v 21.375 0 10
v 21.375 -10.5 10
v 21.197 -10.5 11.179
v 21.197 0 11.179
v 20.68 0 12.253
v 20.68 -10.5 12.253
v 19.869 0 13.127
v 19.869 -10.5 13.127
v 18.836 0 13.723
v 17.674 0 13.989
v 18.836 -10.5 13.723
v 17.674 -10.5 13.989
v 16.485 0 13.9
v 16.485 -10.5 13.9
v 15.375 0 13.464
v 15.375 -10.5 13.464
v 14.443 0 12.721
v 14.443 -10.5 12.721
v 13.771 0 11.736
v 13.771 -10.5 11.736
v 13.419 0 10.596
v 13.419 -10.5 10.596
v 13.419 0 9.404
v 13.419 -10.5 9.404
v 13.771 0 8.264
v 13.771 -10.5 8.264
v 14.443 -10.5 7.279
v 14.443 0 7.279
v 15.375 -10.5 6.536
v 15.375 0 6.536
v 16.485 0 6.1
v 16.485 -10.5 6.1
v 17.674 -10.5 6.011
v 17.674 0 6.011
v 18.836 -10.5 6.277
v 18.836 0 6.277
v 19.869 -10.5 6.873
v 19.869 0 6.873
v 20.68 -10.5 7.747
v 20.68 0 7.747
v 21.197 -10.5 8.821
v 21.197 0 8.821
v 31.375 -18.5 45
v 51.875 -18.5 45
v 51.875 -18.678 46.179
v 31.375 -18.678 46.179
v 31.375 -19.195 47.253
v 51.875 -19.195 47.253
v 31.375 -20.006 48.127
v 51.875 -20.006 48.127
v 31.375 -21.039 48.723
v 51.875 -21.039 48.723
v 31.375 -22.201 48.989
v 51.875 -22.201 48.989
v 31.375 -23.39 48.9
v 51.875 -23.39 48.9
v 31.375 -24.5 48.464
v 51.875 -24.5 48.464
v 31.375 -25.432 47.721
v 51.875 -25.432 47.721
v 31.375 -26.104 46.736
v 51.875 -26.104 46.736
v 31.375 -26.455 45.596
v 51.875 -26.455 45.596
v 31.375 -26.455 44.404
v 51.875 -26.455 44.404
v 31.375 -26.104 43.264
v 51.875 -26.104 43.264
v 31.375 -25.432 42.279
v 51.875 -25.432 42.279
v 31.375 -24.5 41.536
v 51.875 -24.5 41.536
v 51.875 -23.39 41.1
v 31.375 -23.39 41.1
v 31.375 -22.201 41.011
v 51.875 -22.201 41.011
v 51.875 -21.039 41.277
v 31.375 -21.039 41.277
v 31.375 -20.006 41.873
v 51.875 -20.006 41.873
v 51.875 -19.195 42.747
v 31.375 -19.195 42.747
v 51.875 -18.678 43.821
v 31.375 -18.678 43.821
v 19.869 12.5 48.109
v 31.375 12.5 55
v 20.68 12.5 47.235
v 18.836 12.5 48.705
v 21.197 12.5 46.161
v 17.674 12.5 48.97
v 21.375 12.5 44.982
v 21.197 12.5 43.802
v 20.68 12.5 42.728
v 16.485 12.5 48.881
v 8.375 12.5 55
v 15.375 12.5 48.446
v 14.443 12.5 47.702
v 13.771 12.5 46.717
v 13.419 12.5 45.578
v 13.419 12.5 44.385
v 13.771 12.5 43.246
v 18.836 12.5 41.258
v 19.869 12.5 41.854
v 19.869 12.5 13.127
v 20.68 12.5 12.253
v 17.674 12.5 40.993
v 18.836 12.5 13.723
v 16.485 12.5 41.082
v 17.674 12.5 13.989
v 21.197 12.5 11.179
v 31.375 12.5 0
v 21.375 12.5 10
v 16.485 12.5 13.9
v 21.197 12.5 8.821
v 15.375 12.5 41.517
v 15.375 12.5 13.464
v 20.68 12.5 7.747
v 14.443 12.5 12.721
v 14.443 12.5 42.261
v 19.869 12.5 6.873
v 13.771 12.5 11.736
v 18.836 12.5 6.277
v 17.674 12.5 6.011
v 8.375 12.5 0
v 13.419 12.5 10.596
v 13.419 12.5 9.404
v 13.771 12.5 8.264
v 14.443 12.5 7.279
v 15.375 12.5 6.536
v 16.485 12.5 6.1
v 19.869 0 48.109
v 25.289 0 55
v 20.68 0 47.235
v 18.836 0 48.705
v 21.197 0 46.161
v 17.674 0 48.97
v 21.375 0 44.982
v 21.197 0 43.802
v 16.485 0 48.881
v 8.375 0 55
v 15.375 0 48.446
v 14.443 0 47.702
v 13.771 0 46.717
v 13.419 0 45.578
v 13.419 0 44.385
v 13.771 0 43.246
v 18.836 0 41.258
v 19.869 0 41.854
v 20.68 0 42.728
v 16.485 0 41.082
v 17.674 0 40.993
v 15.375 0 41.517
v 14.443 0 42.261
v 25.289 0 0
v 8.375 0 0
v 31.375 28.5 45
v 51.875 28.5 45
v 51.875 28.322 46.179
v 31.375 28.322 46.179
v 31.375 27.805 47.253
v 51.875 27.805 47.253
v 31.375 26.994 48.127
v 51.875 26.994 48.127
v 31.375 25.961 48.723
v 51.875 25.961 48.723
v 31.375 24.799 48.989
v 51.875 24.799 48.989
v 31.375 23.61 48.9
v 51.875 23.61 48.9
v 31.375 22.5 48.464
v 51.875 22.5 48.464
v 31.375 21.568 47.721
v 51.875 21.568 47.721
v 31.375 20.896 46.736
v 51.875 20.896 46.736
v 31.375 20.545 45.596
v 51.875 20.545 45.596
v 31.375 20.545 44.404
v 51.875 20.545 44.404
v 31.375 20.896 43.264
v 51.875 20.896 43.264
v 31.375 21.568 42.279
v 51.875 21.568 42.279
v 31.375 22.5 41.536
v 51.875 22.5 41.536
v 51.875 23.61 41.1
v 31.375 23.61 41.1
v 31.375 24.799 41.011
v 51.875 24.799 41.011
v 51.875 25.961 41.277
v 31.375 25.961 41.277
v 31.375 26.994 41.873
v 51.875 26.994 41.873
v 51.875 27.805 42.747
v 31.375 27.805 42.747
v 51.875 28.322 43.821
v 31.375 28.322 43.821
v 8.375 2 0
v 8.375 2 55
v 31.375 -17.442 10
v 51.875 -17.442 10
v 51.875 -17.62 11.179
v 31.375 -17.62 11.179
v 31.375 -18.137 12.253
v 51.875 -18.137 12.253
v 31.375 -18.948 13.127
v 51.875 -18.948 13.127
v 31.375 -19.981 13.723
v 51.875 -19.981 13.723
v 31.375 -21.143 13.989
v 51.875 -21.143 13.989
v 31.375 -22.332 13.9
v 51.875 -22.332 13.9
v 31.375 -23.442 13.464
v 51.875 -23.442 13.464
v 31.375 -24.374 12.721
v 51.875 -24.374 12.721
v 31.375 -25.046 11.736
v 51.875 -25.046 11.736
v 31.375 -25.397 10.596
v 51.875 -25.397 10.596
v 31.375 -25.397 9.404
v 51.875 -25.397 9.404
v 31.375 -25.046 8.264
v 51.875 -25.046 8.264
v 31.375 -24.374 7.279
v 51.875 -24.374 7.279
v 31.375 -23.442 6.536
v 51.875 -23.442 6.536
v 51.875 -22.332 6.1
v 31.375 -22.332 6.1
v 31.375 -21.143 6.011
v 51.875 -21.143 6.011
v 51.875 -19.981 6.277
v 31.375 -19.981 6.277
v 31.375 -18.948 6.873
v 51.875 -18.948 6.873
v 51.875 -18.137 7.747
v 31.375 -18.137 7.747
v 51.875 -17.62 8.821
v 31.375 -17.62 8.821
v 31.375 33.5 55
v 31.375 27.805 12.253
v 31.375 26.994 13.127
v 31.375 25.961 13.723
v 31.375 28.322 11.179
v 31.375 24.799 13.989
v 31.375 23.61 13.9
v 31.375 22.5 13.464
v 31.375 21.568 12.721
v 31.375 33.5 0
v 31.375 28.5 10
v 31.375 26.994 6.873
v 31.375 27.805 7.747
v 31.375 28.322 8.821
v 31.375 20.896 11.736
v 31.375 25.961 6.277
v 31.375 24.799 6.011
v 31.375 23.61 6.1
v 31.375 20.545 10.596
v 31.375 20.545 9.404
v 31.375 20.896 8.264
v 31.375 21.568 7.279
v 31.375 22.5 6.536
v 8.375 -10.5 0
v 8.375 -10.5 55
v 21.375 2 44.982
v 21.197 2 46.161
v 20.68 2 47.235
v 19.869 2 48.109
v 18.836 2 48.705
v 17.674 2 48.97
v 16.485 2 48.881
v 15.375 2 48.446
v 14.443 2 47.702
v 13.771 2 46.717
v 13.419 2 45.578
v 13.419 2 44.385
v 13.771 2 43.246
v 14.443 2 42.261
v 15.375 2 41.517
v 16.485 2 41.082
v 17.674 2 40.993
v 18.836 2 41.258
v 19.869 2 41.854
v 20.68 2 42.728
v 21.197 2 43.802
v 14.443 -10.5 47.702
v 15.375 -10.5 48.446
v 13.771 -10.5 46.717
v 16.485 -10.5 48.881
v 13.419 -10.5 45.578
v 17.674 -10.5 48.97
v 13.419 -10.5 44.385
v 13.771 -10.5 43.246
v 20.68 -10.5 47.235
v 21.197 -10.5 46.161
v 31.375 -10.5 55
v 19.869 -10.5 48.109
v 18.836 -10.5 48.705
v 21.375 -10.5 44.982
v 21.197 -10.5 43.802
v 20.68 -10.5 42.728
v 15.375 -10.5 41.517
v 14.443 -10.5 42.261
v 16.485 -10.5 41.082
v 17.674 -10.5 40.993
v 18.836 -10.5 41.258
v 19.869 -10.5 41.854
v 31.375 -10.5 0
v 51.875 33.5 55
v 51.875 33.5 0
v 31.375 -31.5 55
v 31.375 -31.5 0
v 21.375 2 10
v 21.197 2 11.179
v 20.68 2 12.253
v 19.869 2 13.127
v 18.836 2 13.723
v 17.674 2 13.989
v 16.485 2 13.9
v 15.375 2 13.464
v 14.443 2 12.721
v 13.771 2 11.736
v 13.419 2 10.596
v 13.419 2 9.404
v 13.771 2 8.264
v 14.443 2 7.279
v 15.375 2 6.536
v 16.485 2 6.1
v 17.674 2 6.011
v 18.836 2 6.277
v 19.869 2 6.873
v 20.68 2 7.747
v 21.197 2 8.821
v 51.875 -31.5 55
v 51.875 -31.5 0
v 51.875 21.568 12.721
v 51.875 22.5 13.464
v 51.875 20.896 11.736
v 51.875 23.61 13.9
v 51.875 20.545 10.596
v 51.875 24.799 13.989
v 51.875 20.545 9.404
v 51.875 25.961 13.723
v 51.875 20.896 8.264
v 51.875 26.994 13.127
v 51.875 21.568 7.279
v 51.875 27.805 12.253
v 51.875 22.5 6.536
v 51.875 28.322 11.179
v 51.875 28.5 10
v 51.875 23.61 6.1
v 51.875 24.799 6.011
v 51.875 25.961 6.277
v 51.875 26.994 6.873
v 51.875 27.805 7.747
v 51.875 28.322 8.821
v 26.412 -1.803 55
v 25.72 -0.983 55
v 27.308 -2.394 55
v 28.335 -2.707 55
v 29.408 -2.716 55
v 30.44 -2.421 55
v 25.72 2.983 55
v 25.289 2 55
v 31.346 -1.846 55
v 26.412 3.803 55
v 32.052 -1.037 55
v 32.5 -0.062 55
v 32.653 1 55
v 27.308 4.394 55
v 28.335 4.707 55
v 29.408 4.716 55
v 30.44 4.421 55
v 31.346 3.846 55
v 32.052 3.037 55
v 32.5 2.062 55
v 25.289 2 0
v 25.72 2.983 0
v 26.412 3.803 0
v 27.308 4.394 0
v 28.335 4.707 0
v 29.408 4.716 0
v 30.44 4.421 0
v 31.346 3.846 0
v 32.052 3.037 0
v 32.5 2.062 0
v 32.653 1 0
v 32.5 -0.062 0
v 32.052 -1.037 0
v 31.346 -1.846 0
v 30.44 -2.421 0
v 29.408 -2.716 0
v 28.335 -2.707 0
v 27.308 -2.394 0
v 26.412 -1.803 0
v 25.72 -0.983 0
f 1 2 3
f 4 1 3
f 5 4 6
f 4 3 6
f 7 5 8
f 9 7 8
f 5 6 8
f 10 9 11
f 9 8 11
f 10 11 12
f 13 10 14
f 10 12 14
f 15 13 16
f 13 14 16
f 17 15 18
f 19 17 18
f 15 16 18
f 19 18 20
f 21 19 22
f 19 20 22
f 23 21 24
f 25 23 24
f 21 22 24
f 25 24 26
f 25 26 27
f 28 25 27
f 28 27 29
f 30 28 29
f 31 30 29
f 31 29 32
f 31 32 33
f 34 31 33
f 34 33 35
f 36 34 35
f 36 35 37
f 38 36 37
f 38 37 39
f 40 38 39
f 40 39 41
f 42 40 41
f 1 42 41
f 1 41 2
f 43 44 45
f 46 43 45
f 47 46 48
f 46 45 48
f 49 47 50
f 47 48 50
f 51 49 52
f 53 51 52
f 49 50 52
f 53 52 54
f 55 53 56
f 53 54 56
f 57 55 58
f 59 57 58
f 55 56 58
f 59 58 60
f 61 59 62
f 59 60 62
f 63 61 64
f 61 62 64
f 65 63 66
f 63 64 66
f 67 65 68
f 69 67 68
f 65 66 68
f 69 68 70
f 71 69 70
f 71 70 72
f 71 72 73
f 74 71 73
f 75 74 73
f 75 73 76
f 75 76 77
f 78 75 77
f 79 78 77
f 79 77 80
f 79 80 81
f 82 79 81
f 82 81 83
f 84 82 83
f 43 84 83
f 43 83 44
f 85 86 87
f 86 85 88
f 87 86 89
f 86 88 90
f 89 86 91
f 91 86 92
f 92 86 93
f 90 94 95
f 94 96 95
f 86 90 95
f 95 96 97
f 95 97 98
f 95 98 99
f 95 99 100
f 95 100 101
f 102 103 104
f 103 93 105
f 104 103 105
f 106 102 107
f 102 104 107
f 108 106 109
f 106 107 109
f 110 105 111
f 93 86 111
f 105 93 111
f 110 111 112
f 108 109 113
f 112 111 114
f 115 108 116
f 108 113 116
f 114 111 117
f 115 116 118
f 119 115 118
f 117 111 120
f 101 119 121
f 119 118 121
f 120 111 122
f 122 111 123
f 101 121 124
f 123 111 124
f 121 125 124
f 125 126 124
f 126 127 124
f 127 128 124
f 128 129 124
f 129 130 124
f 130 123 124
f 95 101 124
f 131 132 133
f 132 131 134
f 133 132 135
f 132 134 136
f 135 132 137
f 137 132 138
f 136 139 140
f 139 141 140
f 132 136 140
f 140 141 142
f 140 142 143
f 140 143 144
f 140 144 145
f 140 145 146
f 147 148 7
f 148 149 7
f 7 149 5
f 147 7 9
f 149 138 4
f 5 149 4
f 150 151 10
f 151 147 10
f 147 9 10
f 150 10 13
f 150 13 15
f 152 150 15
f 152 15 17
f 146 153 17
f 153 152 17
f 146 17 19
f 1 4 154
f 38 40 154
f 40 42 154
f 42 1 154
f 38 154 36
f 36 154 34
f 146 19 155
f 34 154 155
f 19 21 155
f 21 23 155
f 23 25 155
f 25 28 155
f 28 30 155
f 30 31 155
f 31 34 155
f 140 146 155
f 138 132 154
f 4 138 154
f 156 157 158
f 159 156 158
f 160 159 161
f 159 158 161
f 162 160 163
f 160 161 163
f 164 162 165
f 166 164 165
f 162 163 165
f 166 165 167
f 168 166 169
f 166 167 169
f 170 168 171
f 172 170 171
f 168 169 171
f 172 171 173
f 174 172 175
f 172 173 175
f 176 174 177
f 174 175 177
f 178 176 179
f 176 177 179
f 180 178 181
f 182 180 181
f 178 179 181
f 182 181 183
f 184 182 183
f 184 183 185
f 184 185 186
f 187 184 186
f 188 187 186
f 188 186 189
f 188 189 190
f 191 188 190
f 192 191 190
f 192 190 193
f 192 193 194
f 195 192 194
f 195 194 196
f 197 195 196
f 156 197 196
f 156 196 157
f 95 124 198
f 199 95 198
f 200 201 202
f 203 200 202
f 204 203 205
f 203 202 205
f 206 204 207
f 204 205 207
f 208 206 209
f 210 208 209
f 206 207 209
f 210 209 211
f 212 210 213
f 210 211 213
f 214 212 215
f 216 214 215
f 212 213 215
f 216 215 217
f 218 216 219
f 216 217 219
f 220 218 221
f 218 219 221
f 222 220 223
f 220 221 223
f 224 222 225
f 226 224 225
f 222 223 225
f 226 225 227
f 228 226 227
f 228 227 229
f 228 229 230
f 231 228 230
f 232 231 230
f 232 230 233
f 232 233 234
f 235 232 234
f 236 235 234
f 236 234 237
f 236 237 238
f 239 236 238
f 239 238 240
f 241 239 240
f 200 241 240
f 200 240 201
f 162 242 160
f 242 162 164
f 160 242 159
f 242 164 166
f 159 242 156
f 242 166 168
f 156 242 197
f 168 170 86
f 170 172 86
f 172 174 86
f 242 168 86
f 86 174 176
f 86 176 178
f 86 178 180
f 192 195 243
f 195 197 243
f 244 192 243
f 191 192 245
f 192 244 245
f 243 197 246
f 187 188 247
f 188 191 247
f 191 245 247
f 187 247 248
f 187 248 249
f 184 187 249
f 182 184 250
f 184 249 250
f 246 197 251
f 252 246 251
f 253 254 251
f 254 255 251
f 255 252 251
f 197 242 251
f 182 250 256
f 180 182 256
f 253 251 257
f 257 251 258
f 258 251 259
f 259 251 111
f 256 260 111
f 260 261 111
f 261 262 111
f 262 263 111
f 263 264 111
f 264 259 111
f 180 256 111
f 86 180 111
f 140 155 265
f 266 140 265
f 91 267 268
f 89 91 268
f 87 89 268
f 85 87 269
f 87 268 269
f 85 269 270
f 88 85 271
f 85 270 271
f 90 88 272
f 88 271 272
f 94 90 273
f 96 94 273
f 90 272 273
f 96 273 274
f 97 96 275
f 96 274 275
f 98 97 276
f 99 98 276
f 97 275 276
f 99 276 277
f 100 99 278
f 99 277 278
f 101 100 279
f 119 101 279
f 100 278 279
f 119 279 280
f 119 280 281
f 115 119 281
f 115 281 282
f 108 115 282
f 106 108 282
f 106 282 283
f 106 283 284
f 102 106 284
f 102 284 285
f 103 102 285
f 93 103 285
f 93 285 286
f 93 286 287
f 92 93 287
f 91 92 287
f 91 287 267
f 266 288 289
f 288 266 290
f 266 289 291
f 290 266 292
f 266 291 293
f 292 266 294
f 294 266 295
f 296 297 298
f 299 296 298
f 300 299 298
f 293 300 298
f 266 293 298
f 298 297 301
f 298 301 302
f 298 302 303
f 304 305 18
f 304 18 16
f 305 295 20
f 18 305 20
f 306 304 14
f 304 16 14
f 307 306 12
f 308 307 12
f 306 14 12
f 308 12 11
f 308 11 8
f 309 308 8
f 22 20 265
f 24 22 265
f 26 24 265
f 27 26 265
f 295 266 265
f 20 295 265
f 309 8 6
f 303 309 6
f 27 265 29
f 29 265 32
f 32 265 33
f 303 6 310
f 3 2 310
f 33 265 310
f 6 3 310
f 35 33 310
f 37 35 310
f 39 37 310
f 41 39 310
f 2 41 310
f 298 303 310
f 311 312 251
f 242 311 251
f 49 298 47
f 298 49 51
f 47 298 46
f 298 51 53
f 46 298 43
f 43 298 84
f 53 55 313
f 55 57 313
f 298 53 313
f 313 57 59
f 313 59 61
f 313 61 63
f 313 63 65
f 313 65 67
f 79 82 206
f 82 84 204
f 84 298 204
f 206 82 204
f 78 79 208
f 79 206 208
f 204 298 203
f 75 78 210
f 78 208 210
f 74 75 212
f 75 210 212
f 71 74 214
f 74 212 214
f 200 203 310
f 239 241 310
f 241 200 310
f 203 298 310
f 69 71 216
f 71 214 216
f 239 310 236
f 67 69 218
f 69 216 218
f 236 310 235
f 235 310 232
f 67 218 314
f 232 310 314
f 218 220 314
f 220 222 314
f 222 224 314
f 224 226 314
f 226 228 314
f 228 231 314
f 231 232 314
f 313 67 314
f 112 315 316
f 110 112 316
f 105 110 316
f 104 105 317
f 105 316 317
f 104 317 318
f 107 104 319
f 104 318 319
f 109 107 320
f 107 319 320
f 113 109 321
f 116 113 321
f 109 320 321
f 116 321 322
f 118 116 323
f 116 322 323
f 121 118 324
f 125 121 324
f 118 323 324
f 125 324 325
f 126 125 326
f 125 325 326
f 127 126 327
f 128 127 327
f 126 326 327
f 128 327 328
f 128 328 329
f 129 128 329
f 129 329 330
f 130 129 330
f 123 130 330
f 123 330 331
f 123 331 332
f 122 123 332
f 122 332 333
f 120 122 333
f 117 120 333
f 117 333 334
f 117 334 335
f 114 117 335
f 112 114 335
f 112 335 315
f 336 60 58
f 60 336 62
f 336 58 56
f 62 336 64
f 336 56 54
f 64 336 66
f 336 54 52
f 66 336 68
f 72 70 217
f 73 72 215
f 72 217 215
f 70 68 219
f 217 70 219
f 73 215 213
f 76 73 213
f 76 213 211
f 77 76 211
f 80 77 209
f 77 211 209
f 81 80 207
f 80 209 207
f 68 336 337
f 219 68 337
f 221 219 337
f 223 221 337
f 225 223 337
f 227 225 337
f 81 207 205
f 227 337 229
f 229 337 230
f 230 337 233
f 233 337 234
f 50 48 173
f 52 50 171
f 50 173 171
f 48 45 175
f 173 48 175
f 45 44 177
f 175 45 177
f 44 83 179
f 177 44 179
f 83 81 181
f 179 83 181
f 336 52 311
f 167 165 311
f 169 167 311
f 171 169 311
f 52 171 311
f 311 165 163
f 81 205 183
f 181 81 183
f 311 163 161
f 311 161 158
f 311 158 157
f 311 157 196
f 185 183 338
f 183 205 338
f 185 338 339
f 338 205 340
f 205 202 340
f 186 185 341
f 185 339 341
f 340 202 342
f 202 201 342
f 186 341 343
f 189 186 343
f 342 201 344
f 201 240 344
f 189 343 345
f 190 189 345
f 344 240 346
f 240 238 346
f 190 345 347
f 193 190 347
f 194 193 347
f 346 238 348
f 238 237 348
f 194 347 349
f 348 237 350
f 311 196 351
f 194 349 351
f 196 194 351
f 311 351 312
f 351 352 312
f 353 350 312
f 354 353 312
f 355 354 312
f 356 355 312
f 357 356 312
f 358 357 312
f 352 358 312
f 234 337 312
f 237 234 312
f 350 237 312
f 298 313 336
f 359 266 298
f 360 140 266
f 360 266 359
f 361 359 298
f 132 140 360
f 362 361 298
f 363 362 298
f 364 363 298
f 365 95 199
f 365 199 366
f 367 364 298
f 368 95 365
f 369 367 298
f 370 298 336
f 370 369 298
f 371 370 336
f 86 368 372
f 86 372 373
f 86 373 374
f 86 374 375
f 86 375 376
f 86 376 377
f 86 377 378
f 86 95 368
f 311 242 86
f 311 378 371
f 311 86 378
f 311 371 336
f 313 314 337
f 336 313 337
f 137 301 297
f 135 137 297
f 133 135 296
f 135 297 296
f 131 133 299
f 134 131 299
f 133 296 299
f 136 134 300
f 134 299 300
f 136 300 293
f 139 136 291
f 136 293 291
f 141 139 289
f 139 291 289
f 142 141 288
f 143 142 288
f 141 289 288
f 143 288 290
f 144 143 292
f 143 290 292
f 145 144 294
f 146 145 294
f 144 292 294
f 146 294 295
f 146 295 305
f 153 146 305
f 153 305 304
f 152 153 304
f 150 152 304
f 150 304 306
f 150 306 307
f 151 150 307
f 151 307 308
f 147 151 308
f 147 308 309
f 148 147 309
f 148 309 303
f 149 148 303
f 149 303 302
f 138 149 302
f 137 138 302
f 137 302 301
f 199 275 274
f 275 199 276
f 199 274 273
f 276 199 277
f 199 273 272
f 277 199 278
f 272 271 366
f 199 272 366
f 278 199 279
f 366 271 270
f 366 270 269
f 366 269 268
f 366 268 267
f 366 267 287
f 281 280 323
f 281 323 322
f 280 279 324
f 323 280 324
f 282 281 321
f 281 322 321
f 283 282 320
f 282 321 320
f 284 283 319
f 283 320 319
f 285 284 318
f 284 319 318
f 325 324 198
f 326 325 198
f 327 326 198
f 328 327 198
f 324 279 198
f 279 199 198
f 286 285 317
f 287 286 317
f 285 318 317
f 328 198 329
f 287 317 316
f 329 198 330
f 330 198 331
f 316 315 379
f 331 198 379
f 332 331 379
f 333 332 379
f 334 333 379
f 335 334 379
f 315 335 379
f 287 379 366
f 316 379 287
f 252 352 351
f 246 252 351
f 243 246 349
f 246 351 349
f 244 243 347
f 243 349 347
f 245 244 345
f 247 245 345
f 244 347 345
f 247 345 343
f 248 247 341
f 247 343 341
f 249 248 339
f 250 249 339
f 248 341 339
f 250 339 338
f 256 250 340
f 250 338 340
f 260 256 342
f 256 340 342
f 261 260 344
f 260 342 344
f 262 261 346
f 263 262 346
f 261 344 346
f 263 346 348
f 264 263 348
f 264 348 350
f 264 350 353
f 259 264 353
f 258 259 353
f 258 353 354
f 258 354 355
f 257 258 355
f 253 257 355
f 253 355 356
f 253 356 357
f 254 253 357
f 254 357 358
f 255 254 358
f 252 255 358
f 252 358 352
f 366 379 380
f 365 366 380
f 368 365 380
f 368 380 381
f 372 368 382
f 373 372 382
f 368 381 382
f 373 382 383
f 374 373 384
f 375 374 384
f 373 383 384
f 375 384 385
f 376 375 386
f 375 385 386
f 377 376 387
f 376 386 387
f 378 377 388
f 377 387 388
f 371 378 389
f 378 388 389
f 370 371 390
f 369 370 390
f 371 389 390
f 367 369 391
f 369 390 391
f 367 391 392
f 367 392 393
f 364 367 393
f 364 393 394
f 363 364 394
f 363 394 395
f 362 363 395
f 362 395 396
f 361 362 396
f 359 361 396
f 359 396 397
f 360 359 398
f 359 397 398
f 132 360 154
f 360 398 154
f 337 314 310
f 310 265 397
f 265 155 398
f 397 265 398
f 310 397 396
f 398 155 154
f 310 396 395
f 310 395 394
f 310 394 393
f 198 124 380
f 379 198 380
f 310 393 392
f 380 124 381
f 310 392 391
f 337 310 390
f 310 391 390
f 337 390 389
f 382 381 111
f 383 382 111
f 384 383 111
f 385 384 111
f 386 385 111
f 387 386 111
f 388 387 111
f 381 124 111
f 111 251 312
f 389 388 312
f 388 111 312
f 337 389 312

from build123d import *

# Parameters (mm, degrees)
F1_DEPTH = 55
F3_DEPTH = 44.001
F4_R     = 4
F5_DEPTH = 43.501


with BuildPart() as f1:
    # F0 (on Top) → F1 (new body)
    with BuildSketch(Plane.XY):
        with BuildLine():
            Line((51.874786, -31.5), (51.874786, 33.5))
            Line((51.874786, 33.5), (31.374786, 33.5))
            Line((31.374786, 33.5), (31.374786, 12.5))
            Line((31.374786, 12.5), (8.374786, 12.5))
            Line((8.374786, 12.5), (8.374786, 2))
            Line((8.374786, 2), (25.289246, 2))
            ThreePointArc((25.289246, 2), (32.653455, 1), (25.289246, 0))
            Line((25.289246, 0), (8.374786, 0))
            Line((8.374786, 0), (8.374786, -10.5))
            Line((8.374786, -10.5), (31.374786, -10.5))
            Line((31.374786, -10.5), (31.374786, -31.5))
            Line((31.374786, -31.5), (51.874786, -31.5))
        make_face()
    extrude(amount=F1_DEPTH)

    # F2 (on face) → F3 (cut, through all)
    with BuildSketch(Plane.XZ.offset(10.5)):
        with BuildLine():
            ThreePointArc((13.374786, 44.981502), (17.374786, 40.981502), (21.374786, 44.981502))
            ThreePointArc((21.374786, 44.981502), (17.374786, 48.981502), (13.374786, 44.981502))
        make_face()
        with BuildLine():
            ThreePointArc((13.374786, 10), (17.374786, 6), (21.374786, 10))
            ThreePointArc((21.374786, 10), (17.374786, 14), (13.374786, 10))
        make_face()
    extrude(amount=-F3_DEPTH, mode=Mode.SUBTRACT)

    # F4 (on face) → F5 (cut, through all)
    with BuildSketch(Plane.YZ.offset(51.874786)):
        with BuildLine():
            ThreePointArc((-26.5, 45), (-22.5, 41), (-18.5, 45))
            ThreePointArc((-18.5, 45), (-22.5, 49), (-26.5, 45))
        make_face()
        with Locations((24.5, 45)):
            Circle(F4_R)
        with Locations((24.5, 10)):
            Circle(F4_R)
        with BuildLine():
            ThreePointArc((-25.441907, 10), (-21.441907, 6), (-17.441907, 10))
            ThreePointArc((-17.441907, 10), (-21.441907, 14), (-25.441907, 10))
        make_face()
    extrude(amount=-F5_DEPTH, mode=Mode.SUBTRACT)


solid = f1.part
